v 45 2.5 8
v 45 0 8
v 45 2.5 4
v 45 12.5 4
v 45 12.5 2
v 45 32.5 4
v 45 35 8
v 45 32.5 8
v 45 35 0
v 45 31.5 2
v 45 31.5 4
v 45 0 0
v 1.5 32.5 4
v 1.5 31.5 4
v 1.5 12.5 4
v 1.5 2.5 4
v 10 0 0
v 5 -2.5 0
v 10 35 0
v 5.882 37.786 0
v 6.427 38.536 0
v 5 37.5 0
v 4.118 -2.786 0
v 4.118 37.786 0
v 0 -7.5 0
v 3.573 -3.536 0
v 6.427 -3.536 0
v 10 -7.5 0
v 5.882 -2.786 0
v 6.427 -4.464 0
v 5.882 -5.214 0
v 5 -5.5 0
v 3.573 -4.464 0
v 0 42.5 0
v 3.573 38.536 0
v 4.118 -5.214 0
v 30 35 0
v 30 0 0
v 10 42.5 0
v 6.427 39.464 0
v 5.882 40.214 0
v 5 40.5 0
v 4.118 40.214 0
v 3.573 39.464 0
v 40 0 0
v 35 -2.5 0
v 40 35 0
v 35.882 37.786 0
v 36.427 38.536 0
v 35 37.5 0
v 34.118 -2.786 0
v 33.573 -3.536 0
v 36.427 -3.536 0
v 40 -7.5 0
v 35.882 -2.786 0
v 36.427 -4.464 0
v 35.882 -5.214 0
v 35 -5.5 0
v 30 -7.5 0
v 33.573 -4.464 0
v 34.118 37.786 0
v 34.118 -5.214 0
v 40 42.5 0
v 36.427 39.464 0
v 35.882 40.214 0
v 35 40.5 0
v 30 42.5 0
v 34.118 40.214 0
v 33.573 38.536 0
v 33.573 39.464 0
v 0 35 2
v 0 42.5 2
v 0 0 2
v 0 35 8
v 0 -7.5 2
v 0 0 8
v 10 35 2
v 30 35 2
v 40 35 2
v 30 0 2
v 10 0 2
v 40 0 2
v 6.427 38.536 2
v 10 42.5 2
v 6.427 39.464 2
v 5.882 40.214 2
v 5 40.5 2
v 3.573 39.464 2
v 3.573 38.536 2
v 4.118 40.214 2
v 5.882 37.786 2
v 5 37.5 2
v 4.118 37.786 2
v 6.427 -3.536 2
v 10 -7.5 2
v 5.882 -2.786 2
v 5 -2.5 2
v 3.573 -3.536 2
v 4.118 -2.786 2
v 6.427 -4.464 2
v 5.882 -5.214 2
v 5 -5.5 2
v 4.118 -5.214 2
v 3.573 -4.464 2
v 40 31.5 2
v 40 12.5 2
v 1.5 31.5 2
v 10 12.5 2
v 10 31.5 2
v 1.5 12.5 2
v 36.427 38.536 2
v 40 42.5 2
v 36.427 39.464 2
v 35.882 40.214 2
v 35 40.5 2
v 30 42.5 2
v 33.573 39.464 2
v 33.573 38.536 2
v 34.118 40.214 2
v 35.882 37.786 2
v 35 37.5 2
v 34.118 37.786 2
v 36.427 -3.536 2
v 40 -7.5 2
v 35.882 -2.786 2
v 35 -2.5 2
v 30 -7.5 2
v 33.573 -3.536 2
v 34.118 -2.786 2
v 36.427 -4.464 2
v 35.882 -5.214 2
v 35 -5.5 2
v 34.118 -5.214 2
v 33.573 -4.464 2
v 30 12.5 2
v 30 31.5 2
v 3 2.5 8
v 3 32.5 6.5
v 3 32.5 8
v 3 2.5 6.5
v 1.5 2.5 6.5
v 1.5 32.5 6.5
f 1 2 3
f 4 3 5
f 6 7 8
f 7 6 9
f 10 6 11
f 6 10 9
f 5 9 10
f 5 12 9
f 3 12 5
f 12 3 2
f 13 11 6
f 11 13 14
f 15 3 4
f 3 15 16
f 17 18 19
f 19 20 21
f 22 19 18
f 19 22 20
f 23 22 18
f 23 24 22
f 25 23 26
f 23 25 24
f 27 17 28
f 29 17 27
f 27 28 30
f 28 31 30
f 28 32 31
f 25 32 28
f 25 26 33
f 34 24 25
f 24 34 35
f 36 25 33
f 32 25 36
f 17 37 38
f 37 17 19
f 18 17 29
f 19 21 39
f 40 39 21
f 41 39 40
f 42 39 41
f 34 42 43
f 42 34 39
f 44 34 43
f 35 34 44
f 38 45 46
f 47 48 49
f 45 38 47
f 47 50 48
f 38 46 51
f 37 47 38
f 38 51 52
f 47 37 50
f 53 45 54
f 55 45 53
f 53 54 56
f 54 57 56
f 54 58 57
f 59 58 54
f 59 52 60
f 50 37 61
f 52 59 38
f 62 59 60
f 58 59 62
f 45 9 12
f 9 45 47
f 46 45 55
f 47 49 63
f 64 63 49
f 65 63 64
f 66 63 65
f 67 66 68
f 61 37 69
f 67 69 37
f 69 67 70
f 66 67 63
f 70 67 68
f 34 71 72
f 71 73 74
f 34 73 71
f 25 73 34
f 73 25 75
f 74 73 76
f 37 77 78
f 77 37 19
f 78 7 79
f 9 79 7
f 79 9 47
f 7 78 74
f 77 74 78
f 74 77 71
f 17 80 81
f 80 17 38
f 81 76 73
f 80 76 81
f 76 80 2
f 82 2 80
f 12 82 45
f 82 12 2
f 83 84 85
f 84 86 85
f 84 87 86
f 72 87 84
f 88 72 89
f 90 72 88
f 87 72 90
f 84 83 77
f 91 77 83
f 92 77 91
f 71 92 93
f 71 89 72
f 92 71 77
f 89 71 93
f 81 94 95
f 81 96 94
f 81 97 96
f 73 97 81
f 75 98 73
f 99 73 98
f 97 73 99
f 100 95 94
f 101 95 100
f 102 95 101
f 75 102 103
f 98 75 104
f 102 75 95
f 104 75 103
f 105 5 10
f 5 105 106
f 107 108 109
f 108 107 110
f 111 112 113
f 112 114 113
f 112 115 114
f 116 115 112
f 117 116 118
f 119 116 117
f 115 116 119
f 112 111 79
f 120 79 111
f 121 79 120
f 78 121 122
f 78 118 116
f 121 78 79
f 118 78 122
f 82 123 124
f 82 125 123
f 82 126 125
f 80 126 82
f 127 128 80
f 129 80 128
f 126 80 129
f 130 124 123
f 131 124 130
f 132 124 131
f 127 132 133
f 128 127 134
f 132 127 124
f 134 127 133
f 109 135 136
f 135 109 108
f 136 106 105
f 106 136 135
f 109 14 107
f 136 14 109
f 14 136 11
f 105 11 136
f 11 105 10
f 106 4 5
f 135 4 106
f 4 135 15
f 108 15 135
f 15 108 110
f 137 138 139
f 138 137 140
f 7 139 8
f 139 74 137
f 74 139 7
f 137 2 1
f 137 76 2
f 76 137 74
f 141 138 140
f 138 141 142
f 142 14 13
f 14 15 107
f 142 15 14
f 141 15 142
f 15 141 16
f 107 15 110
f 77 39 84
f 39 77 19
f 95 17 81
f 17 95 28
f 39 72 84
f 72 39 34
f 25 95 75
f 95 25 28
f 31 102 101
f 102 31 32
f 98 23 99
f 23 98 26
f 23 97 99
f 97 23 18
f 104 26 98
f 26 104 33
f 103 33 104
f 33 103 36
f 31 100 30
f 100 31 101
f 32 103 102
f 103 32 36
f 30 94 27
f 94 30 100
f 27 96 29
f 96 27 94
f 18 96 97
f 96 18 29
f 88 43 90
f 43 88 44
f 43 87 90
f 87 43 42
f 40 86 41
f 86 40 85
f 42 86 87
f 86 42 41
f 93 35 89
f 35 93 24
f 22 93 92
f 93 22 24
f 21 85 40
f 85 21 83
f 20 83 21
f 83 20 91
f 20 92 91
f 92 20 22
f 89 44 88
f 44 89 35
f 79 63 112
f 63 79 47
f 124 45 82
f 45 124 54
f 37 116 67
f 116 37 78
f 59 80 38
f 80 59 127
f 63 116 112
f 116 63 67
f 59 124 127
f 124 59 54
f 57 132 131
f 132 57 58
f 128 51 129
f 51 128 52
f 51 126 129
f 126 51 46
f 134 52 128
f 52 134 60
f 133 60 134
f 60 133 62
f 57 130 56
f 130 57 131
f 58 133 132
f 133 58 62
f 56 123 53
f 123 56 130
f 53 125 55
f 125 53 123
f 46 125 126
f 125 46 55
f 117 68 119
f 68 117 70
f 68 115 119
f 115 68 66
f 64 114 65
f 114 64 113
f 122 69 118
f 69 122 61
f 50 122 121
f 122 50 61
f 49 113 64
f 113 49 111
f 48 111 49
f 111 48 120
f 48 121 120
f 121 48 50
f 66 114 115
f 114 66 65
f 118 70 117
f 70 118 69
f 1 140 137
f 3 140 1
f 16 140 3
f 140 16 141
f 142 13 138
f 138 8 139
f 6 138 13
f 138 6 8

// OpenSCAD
$fn=10;

difference(){
    cube([45,35,4]);
    translate([0,12.5,2])cube([45.1,19,2.1]);   
}
cube([45,2.5,8]);
translate([0,32.5,0])cube([45,2.5,8]);
difference(){
    cube([3,35,8]);
    translate([1.5,0,2])cube([3,35,4.5]);
}
difference(){
    translate([0,-7.5,0])cube([10,50,2]);
    translate([5,-4,-1])rotate([0,0,90])cylinder(r=1.5,h=100);
    translate([5,39,-1])rotate([0,0,90])cylinder(r=1.5,h=100);
}
difference(){
    translate([30,-7.5,0])cube([10,50,2]);
    translate([35,-4,-1])rotate([0,0,90])cylinder(r=1.5,h=100);
    translate([35,39,-1])rotate([0,0,90])cylinder(r=1.5,h=100);
}
